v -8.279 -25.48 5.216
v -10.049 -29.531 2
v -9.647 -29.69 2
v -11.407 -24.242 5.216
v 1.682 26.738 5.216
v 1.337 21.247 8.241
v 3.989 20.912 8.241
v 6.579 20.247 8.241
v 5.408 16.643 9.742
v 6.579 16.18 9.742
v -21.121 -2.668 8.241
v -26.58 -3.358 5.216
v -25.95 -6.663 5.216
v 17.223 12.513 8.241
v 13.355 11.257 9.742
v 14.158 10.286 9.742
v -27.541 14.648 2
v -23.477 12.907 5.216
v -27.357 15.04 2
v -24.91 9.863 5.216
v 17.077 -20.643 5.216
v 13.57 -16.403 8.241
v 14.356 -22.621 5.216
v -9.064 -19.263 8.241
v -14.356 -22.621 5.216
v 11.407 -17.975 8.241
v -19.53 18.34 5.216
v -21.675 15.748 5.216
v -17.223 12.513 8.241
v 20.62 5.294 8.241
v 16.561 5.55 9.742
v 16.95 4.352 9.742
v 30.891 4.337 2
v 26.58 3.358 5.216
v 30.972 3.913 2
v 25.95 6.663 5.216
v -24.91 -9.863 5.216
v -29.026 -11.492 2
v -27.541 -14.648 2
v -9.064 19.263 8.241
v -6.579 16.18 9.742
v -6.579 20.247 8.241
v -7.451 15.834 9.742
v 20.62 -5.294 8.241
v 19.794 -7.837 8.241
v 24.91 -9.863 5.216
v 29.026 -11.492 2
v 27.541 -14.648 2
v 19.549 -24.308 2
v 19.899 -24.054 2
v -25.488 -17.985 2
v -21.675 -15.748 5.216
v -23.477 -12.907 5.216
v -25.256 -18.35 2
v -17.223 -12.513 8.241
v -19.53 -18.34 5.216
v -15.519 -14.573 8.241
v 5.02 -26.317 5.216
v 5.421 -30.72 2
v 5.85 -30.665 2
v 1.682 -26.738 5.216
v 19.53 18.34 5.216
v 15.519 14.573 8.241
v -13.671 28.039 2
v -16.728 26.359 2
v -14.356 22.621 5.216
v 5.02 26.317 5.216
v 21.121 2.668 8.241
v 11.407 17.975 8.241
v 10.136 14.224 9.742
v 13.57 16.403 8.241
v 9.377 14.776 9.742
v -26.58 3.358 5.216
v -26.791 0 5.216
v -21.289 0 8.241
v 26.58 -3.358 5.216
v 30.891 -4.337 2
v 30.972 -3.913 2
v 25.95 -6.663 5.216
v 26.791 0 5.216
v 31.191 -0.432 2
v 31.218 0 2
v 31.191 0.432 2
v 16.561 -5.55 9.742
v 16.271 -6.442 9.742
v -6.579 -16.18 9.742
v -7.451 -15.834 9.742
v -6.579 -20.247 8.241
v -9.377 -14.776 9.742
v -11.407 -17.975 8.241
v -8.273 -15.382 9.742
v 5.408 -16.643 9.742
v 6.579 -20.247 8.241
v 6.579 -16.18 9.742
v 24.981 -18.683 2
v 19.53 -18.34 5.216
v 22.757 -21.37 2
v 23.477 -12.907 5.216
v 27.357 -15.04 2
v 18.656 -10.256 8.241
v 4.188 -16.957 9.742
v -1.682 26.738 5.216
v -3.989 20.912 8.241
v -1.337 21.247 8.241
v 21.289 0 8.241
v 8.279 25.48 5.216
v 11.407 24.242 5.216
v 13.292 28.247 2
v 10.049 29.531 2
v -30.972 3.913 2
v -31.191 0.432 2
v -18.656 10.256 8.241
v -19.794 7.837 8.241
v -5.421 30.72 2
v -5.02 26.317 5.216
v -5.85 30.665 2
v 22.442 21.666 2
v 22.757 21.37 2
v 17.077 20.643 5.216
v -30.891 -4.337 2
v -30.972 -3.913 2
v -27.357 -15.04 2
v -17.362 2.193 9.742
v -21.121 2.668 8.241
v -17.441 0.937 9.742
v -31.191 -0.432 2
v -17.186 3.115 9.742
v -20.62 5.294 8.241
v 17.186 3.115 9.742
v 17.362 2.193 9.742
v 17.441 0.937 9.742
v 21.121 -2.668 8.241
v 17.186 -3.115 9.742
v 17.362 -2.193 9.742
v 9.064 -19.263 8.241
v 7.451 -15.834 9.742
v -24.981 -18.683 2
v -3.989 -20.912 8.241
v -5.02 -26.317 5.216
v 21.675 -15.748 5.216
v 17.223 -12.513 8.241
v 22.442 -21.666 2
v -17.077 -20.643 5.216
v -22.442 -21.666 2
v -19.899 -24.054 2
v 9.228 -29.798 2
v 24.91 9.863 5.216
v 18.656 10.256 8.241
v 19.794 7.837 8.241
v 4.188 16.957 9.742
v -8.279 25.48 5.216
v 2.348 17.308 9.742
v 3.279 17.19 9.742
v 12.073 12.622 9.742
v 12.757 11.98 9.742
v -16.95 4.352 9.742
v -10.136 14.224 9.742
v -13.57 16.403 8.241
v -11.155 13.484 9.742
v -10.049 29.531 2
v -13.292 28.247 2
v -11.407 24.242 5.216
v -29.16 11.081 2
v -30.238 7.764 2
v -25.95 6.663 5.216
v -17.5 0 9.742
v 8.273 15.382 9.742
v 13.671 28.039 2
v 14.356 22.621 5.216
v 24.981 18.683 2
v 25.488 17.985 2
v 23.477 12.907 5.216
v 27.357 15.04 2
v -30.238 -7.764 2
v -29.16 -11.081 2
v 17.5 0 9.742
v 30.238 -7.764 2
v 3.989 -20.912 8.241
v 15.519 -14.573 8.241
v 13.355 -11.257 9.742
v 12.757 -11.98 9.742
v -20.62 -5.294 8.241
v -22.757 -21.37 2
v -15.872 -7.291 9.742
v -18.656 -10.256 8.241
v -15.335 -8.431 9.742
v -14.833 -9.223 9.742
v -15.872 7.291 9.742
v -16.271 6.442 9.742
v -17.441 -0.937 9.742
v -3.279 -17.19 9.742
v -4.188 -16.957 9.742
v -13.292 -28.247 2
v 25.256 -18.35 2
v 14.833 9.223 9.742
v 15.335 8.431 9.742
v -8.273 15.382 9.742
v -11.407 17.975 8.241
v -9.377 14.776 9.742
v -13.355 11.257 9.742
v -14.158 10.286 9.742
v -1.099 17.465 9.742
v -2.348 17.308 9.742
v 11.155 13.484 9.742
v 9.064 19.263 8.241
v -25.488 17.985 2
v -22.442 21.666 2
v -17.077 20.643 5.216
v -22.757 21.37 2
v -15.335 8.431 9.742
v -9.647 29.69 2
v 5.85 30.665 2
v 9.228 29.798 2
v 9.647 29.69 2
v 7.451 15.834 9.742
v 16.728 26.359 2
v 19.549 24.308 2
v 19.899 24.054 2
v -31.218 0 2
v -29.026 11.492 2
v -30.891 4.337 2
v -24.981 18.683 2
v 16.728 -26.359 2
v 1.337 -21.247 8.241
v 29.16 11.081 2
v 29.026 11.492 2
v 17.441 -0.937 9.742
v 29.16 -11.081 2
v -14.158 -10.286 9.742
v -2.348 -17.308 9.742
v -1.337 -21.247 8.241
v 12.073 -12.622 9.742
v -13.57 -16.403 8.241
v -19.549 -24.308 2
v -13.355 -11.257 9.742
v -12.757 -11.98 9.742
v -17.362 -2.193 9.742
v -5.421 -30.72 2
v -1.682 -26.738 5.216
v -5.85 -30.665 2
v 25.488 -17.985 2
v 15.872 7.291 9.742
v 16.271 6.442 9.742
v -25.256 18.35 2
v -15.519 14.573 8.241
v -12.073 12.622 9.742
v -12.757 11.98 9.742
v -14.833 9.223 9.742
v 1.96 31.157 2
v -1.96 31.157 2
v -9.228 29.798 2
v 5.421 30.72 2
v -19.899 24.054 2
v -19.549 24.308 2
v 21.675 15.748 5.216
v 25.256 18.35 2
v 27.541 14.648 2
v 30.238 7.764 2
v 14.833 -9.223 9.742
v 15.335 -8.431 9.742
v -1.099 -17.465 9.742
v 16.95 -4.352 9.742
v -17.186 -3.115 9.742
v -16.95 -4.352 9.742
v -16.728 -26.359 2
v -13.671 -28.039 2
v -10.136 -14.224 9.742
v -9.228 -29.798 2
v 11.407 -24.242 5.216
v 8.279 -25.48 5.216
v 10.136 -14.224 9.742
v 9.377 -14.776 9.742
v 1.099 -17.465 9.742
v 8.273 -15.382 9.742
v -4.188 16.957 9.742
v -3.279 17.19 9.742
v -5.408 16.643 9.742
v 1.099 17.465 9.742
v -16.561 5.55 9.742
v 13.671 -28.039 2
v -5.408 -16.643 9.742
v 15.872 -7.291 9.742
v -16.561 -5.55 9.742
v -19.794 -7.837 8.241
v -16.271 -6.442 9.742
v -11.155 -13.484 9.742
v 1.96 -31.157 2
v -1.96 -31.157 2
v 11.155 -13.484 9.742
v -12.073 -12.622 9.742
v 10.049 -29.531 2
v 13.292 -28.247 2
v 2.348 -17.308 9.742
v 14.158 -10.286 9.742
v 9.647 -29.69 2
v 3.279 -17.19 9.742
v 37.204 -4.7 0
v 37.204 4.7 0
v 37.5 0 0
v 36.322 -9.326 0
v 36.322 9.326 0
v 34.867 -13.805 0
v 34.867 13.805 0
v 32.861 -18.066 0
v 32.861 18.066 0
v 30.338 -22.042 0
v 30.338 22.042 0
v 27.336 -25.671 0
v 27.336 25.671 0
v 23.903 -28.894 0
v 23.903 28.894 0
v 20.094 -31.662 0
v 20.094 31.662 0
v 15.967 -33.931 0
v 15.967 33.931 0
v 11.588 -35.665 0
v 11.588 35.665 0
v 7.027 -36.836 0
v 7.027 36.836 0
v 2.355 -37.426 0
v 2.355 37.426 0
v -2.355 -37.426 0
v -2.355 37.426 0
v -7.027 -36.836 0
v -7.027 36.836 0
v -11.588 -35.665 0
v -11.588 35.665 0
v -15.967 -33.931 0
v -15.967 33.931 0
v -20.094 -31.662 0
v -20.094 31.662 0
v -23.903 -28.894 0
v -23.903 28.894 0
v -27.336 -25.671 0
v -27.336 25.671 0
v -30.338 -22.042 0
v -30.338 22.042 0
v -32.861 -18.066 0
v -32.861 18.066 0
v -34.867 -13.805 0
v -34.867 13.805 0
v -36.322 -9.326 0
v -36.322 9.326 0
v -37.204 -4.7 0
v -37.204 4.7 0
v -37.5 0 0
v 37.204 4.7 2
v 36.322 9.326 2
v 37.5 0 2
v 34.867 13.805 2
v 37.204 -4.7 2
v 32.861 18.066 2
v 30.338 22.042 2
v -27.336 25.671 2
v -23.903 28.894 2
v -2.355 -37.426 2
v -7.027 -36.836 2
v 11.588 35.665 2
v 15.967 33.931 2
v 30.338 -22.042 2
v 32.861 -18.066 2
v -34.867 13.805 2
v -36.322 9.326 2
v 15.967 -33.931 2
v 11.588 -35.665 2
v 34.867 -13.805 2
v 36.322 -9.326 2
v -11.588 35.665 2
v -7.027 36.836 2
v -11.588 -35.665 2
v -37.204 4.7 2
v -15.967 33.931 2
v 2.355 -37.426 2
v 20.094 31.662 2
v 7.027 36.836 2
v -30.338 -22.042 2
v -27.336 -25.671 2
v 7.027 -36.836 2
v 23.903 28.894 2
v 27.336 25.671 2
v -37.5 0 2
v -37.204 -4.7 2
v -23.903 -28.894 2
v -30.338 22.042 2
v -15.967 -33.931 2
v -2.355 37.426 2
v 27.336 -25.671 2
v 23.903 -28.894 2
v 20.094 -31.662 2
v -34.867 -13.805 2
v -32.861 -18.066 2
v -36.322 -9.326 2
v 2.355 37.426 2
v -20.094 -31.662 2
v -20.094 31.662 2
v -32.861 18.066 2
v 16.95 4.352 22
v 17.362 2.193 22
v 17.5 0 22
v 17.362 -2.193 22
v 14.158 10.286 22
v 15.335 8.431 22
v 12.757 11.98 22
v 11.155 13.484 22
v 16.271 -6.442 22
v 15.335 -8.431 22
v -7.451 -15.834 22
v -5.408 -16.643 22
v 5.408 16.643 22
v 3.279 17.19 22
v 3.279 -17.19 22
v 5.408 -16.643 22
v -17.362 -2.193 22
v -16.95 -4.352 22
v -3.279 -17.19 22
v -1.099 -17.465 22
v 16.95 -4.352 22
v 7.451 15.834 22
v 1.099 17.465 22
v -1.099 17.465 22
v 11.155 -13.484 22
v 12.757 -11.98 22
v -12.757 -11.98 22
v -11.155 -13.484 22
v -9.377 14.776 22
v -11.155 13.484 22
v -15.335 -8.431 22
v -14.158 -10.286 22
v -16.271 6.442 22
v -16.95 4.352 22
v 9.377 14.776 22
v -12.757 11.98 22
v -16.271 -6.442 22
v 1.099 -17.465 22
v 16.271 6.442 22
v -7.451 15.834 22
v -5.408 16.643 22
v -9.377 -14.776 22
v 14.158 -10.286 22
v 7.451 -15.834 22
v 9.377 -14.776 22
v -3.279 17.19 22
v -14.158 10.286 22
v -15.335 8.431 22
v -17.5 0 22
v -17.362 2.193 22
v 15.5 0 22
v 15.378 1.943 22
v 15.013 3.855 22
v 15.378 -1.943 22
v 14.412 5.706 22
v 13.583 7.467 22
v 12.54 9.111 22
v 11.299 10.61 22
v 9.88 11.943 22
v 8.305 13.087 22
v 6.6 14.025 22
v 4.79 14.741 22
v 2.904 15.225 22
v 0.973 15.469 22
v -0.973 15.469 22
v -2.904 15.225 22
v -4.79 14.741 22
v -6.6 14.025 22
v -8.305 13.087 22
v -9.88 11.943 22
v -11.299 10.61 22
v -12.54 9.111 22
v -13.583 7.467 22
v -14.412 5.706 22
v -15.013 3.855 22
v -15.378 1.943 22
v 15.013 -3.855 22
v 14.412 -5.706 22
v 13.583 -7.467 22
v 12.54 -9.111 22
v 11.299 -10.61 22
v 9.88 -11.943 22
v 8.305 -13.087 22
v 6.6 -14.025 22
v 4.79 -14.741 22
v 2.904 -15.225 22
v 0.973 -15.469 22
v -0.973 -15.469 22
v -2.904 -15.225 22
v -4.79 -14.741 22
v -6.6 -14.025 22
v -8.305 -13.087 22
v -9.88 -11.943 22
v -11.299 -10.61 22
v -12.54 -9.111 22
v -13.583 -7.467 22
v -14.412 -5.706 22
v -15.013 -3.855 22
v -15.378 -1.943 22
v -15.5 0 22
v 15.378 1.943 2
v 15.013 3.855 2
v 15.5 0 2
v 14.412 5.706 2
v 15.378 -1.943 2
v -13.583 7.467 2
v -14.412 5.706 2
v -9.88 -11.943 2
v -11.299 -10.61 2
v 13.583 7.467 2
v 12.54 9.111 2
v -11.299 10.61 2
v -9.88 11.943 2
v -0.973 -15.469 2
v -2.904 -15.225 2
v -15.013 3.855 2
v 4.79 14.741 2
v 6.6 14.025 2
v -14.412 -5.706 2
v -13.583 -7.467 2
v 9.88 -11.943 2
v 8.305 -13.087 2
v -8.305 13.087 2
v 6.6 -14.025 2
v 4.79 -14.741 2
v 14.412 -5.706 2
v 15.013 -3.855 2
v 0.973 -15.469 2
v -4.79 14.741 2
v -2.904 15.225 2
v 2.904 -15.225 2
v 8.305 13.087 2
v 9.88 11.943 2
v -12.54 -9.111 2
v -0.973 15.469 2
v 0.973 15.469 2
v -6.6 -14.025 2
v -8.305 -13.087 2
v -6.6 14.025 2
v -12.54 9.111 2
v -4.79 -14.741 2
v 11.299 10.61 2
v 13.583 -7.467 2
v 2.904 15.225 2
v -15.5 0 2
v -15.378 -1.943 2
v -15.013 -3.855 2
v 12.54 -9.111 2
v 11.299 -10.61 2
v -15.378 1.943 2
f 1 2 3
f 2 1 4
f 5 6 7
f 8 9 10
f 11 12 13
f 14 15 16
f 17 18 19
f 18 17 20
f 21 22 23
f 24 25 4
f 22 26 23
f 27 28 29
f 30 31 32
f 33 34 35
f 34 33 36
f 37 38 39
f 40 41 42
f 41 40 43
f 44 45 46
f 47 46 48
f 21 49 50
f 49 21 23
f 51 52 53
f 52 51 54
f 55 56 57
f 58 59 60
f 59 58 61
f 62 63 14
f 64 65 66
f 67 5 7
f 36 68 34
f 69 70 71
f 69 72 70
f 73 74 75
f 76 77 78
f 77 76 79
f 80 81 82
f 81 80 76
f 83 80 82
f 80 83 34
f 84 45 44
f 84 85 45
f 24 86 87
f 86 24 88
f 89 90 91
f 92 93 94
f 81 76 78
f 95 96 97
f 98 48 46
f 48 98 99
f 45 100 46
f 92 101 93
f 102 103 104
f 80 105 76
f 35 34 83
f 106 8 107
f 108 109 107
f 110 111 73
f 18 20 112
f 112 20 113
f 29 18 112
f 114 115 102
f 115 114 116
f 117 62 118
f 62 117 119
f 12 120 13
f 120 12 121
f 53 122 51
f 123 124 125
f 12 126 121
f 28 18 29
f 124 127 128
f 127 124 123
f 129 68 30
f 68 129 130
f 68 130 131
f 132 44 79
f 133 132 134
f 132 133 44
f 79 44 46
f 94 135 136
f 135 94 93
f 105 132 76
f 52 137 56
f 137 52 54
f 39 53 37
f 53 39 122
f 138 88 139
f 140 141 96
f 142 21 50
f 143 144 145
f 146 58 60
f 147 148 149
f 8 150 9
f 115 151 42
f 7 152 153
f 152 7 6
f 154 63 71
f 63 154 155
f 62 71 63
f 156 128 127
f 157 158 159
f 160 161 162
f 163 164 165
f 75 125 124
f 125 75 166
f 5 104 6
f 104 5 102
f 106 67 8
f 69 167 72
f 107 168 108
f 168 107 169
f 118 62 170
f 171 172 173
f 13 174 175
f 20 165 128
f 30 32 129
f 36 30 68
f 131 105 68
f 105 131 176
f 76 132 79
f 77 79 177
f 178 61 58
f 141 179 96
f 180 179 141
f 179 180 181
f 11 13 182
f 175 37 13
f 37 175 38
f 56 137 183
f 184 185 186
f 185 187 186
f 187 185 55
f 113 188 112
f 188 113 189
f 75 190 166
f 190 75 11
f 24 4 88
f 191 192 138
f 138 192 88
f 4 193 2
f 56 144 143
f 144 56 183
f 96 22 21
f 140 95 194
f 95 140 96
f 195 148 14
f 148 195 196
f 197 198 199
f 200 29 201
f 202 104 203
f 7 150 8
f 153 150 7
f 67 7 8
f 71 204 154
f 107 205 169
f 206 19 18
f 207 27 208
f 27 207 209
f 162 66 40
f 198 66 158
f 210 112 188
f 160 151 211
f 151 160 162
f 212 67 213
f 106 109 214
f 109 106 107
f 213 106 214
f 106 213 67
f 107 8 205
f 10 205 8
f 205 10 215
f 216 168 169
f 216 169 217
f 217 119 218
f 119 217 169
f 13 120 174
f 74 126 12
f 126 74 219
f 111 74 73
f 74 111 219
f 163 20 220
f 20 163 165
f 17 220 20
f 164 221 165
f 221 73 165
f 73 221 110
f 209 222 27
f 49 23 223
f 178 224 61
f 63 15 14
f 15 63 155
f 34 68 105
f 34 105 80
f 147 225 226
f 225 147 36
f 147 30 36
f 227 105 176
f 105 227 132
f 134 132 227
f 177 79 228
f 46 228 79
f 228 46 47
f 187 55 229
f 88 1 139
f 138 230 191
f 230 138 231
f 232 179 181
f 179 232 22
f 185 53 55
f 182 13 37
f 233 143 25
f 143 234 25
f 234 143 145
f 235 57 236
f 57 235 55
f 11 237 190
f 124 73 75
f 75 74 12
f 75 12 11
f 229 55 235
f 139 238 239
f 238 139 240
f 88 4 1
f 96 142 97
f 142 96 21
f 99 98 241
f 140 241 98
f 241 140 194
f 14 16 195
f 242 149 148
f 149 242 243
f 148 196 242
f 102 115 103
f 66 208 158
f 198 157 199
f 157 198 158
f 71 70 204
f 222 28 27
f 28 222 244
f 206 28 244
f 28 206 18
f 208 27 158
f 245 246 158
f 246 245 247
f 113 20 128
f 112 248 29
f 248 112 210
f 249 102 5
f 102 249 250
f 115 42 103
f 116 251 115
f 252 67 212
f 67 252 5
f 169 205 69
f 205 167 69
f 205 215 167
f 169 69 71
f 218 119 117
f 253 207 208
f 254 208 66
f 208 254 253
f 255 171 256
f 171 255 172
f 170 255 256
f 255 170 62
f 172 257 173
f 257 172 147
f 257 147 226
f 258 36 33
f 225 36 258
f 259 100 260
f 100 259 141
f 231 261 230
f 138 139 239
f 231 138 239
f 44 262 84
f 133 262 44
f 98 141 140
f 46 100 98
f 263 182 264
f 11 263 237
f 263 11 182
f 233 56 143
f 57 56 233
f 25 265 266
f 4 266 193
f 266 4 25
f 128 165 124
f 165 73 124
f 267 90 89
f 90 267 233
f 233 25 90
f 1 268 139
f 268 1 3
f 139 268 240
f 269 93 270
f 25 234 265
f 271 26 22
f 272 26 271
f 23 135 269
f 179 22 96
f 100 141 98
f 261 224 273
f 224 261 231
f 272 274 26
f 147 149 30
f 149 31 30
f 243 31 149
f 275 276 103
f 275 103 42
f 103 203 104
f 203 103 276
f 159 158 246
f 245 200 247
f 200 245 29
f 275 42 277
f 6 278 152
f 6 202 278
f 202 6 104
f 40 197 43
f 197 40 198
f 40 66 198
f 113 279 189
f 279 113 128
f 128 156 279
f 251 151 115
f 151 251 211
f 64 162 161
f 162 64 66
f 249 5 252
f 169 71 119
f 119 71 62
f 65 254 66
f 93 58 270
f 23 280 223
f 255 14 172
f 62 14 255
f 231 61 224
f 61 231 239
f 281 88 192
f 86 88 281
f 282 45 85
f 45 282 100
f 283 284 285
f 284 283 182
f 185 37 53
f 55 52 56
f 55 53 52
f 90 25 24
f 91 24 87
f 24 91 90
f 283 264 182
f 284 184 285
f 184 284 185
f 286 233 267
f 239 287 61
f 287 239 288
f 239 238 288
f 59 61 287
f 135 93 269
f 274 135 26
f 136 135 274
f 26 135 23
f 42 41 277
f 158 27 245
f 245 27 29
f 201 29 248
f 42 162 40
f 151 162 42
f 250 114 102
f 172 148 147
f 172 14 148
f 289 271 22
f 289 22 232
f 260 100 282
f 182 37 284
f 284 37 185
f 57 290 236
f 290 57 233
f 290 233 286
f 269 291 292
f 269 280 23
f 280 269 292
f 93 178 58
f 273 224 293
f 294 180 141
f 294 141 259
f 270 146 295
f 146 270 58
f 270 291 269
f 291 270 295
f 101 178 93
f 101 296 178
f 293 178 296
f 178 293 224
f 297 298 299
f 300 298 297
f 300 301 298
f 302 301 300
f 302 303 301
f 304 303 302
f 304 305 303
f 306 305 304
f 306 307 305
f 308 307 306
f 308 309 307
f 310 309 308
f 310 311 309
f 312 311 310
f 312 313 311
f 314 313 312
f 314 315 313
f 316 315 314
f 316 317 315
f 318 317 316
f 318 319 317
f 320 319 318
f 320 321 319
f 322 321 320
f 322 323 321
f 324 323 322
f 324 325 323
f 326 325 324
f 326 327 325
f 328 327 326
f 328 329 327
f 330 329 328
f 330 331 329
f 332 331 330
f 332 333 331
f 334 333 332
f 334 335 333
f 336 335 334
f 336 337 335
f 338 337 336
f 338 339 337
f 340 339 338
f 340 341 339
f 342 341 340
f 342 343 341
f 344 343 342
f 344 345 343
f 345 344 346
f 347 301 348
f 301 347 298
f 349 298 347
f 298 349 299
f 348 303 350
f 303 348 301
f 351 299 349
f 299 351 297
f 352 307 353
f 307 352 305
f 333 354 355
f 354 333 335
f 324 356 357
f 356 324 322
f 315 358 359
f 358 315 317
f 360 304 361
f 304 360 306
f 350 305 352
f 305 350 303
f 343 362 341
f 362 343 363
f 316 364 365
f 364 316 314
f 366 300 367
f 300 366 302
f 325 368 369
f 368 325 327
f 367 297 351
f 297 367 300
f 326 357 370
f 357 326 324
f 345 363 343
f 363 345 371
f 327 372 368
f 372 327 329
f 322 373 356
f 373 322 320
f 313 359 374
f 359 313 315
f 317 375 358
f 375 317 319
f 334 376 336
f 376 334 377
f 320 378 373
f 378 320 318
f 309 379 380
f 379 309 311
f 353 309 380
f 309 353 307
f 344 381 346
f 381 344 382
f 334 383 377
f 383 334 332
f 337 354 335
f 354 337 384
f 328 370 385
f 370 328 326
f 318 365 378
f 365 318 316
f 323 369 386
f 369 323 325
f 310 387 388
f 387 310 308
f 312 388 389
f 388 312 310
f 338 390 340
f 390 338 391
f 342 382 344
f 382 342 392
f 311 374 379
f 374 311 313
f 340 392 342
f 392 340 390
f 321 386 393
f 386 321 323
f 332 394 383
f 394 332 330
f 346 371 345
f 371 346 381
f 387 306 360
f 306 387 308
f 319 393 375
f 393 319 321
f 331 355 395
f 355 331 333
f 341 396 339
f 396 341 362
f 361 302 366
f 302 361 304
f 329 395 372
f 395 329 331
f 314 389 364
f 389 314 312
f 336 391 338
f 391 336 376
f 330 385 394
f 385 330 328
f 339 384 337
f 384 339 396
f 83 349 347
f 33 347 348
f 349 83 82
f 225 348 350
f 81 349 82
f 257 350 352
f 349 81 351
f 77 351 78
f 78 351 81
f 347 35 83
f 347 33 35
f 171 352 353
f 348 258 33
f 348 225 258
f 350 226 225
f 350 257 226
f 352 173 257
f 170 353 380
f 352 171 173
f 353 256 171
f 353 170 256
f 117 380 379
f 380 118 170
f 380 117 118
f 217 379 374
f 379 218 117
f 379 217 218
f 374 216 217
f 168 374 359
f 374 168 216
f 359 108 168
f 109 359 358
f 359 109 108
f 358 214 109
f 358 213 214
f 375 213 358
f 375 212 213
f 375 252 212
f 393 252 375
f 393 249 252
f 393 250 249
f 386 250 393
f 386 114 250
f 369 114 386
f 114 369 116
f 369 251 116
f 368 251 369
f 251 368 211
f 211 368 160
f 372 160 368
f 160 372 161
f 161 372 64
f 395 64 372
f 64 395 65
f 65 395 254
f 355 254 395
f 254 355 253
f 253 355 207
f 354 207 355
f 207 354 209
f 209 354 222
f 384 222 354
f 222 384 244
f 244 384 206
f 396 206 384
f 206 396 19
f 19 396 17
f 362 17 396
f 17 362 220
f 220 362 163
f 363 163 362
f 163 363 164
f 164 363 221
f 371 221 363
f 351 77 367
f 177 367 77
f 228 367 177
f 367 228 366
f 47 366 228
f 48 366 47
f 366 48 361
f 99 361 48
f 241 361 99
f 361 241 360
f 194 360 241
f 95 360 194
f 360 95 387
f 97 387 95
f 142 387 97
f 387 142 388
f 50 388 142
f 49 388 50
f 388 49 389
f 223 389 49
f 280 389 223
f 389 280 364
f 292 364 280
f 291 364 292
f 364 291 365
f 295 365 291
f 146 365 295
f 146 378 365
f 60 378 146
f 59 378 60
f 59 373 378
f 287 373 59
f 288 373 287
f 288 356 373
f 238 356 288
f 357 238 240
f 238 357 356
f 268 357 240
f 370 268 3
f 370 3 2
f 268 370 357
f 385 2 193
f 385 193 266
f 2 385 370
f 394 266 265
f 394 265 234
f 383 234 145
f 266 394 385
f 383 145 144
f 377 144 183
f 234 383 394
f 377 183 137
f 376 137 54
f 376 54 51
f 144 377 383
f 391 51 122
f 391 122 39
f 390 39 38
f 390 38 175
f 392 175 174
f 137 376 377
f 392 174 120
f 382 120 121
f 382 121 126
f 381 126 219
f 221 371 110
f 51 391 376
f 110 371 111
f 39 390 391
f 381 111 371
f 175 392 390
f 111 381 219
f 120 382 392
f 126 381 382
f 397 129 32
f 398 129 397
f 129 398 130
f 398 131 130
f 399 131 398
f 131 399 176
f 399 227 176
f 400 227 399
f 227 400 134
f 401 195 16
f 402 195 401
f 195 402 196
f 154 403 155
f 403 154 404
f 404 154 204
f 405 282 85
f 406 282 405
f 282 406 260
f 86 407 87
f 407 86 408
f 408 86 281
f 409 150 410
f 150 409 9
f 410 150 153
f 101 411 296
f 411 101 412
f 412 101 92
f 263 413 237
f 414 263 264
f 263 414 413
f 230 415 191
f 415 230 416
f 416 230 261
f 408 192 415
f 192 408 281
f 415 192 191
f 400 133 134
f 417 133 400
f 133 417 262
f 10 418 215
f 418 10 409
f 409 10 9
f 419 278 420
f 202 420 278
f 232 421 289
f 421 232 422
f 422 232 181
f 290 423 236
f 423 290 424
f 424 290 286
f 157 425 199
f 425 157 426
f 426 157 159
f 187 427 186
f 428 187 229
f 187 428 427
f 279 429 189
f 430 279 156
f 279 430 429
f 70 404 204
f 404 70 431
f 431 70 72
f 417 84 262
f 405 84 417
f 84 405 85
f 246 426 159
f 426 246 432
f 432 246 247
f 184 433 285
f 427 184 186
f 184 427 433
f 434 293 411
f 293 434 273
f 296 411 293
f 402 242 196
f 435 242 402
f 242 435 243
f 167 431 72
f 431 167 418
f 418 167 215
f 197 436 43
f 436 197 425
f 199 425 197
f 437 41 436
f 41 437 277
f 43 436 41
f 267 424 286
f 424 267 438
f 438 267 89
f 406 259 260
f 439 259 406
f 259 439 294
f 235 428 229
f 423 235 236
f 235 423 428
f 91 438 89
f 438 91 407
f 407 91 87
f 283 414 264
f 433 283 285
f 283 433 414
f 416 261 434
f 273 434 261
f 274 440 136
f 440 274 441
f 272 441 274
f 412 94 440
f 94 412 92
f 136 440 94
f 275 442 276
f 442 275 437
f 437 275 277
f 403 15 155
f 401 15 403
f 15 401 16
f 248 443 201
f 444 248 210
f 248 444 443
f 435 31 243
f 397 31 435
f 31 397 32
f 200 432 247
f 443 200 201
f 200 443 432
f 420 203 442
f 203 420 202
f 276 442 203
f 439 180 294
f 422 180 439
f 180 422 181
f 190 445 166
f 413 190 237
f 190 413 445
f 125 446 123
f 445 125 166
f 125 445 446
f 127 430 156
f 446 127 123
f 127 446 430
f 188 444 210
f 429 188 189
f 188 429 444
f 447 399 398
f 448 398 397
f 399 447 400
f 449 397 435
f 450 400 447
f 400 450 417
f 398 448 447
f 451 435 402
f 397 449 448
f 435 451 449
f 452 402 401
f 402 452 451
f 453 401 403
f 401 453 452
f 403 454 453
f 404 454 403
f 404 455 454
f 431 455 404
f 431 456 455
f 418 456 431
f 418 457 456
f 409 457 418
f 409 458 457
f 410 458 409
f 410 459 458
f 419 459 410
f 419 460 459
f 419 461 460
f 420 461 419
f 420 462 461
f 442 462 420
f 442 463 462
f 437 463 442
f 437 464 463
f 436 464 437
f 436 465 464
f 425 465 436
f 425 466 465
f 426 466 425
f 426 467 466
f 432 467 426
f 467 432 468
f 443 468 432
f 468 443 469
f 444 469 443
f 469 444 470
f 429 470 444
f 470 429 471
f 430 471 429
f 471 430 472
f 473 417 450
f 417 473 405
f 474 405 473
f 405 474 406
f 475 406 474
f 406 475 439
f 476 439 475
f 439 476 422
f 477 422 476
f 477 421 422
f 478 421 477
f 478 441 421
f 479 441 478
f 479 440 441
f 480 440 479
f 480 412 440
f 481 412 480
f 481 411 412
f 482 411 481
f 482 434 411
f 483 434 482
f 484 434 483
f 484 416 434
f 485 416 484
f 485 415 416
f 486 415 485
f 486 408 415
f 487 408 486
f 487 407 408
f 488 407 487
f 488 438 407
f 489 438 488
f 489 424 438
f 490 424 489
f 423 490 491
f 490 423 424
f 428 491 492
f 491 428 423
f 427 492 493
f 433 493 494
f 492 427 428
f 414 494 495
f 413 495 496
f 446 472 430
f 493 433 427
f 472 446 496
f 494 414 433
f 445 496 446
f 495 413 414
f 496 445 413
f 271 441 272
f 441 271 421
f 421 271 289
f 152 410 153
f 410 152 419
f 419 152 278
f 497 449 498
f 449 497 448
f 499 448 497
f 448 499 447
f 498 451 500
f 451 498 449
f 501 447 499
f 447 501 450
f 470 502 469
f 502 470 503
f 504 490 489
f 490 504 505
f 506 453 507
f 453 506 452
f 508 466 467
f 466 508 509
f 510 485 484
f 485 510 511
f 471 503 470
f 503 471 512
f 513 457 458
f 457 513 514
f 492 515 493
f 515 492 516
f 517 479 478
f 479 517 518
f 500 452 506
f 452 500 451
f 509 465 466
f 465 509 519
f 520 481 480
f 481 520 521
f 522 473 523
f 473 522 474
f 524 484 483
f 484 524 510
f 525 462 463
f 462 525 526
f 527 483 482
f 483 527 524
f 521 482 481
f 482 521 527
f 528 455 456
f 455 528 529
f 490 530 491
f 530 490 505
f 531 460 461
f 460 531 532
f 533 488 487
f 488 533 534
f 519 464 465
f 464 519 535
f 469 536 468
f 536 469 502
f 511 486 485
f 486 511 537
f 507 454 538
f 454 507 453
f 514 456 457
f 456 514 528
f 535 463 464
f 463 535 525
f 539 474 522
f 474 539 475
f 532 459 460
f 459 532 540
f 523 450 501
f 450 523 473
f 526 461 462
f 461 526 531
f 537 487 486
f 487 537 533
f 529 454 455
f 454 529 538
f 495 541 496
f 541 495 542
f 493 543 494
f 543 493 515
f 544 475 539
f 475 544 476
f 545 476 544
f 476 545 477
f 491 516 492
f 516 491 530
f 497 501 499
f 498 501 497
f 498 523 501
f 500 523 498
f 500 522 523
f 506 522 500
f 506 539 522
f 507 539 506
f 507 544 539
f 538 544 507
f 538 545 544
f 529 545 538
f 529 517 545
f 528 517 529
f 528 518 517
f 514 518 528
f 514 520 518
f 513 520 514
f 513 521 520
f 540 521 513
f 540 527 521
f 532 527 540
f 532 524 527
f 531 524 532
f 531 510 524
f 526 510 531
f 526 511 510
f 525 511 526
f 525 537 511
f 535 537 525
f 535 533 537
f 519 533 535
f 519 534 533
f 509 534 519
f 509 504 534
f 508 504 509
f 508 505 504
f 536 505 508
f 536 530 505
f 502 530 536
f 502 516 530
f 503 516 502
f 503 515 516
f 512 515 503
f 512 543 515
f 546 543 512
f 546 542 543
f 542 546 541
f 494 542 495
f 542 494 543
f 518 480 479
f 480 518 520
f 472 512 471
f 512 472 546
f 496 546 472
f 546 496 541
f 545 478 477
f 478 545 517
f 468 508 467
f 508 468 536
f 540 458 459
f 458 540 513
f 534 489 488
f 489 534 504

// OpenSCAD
// http://www.thingiverse.com/thing:1445822

base_thickness = 2.0;
base_diameter = 75.0;

post_idiameter = 31.0;
post_height = 20.0;
post_thickness = 2.0;

dome_diameter = 100;
dome_height = 13;

$fn = 50;

module base() {
   cylinder(d=base_diameter, h=base_thickness);
}

module post() {
    cylinder(d=post_idiameter+post_thickness*2, h=post_height+base_thickness);
}

module dome() {
    difference() {
        translate([0,0,-dome_diameter/2+dome_height]) sphere(d=dome_diameter);
        translate([-dome_diameter/2,-dome_diameter/2,-dome_diameter]) cube([dome_diameter,dome_diameter,dome_diameter]);
    }
}

module body() {

    union() {
        base();
        dome();
        post();
    }
}

// cutout the post hole
difference() {
    body();
    translate([0,0,base_thickness]) cylinder(d=post_idiameter, h=post_height*2);

}
